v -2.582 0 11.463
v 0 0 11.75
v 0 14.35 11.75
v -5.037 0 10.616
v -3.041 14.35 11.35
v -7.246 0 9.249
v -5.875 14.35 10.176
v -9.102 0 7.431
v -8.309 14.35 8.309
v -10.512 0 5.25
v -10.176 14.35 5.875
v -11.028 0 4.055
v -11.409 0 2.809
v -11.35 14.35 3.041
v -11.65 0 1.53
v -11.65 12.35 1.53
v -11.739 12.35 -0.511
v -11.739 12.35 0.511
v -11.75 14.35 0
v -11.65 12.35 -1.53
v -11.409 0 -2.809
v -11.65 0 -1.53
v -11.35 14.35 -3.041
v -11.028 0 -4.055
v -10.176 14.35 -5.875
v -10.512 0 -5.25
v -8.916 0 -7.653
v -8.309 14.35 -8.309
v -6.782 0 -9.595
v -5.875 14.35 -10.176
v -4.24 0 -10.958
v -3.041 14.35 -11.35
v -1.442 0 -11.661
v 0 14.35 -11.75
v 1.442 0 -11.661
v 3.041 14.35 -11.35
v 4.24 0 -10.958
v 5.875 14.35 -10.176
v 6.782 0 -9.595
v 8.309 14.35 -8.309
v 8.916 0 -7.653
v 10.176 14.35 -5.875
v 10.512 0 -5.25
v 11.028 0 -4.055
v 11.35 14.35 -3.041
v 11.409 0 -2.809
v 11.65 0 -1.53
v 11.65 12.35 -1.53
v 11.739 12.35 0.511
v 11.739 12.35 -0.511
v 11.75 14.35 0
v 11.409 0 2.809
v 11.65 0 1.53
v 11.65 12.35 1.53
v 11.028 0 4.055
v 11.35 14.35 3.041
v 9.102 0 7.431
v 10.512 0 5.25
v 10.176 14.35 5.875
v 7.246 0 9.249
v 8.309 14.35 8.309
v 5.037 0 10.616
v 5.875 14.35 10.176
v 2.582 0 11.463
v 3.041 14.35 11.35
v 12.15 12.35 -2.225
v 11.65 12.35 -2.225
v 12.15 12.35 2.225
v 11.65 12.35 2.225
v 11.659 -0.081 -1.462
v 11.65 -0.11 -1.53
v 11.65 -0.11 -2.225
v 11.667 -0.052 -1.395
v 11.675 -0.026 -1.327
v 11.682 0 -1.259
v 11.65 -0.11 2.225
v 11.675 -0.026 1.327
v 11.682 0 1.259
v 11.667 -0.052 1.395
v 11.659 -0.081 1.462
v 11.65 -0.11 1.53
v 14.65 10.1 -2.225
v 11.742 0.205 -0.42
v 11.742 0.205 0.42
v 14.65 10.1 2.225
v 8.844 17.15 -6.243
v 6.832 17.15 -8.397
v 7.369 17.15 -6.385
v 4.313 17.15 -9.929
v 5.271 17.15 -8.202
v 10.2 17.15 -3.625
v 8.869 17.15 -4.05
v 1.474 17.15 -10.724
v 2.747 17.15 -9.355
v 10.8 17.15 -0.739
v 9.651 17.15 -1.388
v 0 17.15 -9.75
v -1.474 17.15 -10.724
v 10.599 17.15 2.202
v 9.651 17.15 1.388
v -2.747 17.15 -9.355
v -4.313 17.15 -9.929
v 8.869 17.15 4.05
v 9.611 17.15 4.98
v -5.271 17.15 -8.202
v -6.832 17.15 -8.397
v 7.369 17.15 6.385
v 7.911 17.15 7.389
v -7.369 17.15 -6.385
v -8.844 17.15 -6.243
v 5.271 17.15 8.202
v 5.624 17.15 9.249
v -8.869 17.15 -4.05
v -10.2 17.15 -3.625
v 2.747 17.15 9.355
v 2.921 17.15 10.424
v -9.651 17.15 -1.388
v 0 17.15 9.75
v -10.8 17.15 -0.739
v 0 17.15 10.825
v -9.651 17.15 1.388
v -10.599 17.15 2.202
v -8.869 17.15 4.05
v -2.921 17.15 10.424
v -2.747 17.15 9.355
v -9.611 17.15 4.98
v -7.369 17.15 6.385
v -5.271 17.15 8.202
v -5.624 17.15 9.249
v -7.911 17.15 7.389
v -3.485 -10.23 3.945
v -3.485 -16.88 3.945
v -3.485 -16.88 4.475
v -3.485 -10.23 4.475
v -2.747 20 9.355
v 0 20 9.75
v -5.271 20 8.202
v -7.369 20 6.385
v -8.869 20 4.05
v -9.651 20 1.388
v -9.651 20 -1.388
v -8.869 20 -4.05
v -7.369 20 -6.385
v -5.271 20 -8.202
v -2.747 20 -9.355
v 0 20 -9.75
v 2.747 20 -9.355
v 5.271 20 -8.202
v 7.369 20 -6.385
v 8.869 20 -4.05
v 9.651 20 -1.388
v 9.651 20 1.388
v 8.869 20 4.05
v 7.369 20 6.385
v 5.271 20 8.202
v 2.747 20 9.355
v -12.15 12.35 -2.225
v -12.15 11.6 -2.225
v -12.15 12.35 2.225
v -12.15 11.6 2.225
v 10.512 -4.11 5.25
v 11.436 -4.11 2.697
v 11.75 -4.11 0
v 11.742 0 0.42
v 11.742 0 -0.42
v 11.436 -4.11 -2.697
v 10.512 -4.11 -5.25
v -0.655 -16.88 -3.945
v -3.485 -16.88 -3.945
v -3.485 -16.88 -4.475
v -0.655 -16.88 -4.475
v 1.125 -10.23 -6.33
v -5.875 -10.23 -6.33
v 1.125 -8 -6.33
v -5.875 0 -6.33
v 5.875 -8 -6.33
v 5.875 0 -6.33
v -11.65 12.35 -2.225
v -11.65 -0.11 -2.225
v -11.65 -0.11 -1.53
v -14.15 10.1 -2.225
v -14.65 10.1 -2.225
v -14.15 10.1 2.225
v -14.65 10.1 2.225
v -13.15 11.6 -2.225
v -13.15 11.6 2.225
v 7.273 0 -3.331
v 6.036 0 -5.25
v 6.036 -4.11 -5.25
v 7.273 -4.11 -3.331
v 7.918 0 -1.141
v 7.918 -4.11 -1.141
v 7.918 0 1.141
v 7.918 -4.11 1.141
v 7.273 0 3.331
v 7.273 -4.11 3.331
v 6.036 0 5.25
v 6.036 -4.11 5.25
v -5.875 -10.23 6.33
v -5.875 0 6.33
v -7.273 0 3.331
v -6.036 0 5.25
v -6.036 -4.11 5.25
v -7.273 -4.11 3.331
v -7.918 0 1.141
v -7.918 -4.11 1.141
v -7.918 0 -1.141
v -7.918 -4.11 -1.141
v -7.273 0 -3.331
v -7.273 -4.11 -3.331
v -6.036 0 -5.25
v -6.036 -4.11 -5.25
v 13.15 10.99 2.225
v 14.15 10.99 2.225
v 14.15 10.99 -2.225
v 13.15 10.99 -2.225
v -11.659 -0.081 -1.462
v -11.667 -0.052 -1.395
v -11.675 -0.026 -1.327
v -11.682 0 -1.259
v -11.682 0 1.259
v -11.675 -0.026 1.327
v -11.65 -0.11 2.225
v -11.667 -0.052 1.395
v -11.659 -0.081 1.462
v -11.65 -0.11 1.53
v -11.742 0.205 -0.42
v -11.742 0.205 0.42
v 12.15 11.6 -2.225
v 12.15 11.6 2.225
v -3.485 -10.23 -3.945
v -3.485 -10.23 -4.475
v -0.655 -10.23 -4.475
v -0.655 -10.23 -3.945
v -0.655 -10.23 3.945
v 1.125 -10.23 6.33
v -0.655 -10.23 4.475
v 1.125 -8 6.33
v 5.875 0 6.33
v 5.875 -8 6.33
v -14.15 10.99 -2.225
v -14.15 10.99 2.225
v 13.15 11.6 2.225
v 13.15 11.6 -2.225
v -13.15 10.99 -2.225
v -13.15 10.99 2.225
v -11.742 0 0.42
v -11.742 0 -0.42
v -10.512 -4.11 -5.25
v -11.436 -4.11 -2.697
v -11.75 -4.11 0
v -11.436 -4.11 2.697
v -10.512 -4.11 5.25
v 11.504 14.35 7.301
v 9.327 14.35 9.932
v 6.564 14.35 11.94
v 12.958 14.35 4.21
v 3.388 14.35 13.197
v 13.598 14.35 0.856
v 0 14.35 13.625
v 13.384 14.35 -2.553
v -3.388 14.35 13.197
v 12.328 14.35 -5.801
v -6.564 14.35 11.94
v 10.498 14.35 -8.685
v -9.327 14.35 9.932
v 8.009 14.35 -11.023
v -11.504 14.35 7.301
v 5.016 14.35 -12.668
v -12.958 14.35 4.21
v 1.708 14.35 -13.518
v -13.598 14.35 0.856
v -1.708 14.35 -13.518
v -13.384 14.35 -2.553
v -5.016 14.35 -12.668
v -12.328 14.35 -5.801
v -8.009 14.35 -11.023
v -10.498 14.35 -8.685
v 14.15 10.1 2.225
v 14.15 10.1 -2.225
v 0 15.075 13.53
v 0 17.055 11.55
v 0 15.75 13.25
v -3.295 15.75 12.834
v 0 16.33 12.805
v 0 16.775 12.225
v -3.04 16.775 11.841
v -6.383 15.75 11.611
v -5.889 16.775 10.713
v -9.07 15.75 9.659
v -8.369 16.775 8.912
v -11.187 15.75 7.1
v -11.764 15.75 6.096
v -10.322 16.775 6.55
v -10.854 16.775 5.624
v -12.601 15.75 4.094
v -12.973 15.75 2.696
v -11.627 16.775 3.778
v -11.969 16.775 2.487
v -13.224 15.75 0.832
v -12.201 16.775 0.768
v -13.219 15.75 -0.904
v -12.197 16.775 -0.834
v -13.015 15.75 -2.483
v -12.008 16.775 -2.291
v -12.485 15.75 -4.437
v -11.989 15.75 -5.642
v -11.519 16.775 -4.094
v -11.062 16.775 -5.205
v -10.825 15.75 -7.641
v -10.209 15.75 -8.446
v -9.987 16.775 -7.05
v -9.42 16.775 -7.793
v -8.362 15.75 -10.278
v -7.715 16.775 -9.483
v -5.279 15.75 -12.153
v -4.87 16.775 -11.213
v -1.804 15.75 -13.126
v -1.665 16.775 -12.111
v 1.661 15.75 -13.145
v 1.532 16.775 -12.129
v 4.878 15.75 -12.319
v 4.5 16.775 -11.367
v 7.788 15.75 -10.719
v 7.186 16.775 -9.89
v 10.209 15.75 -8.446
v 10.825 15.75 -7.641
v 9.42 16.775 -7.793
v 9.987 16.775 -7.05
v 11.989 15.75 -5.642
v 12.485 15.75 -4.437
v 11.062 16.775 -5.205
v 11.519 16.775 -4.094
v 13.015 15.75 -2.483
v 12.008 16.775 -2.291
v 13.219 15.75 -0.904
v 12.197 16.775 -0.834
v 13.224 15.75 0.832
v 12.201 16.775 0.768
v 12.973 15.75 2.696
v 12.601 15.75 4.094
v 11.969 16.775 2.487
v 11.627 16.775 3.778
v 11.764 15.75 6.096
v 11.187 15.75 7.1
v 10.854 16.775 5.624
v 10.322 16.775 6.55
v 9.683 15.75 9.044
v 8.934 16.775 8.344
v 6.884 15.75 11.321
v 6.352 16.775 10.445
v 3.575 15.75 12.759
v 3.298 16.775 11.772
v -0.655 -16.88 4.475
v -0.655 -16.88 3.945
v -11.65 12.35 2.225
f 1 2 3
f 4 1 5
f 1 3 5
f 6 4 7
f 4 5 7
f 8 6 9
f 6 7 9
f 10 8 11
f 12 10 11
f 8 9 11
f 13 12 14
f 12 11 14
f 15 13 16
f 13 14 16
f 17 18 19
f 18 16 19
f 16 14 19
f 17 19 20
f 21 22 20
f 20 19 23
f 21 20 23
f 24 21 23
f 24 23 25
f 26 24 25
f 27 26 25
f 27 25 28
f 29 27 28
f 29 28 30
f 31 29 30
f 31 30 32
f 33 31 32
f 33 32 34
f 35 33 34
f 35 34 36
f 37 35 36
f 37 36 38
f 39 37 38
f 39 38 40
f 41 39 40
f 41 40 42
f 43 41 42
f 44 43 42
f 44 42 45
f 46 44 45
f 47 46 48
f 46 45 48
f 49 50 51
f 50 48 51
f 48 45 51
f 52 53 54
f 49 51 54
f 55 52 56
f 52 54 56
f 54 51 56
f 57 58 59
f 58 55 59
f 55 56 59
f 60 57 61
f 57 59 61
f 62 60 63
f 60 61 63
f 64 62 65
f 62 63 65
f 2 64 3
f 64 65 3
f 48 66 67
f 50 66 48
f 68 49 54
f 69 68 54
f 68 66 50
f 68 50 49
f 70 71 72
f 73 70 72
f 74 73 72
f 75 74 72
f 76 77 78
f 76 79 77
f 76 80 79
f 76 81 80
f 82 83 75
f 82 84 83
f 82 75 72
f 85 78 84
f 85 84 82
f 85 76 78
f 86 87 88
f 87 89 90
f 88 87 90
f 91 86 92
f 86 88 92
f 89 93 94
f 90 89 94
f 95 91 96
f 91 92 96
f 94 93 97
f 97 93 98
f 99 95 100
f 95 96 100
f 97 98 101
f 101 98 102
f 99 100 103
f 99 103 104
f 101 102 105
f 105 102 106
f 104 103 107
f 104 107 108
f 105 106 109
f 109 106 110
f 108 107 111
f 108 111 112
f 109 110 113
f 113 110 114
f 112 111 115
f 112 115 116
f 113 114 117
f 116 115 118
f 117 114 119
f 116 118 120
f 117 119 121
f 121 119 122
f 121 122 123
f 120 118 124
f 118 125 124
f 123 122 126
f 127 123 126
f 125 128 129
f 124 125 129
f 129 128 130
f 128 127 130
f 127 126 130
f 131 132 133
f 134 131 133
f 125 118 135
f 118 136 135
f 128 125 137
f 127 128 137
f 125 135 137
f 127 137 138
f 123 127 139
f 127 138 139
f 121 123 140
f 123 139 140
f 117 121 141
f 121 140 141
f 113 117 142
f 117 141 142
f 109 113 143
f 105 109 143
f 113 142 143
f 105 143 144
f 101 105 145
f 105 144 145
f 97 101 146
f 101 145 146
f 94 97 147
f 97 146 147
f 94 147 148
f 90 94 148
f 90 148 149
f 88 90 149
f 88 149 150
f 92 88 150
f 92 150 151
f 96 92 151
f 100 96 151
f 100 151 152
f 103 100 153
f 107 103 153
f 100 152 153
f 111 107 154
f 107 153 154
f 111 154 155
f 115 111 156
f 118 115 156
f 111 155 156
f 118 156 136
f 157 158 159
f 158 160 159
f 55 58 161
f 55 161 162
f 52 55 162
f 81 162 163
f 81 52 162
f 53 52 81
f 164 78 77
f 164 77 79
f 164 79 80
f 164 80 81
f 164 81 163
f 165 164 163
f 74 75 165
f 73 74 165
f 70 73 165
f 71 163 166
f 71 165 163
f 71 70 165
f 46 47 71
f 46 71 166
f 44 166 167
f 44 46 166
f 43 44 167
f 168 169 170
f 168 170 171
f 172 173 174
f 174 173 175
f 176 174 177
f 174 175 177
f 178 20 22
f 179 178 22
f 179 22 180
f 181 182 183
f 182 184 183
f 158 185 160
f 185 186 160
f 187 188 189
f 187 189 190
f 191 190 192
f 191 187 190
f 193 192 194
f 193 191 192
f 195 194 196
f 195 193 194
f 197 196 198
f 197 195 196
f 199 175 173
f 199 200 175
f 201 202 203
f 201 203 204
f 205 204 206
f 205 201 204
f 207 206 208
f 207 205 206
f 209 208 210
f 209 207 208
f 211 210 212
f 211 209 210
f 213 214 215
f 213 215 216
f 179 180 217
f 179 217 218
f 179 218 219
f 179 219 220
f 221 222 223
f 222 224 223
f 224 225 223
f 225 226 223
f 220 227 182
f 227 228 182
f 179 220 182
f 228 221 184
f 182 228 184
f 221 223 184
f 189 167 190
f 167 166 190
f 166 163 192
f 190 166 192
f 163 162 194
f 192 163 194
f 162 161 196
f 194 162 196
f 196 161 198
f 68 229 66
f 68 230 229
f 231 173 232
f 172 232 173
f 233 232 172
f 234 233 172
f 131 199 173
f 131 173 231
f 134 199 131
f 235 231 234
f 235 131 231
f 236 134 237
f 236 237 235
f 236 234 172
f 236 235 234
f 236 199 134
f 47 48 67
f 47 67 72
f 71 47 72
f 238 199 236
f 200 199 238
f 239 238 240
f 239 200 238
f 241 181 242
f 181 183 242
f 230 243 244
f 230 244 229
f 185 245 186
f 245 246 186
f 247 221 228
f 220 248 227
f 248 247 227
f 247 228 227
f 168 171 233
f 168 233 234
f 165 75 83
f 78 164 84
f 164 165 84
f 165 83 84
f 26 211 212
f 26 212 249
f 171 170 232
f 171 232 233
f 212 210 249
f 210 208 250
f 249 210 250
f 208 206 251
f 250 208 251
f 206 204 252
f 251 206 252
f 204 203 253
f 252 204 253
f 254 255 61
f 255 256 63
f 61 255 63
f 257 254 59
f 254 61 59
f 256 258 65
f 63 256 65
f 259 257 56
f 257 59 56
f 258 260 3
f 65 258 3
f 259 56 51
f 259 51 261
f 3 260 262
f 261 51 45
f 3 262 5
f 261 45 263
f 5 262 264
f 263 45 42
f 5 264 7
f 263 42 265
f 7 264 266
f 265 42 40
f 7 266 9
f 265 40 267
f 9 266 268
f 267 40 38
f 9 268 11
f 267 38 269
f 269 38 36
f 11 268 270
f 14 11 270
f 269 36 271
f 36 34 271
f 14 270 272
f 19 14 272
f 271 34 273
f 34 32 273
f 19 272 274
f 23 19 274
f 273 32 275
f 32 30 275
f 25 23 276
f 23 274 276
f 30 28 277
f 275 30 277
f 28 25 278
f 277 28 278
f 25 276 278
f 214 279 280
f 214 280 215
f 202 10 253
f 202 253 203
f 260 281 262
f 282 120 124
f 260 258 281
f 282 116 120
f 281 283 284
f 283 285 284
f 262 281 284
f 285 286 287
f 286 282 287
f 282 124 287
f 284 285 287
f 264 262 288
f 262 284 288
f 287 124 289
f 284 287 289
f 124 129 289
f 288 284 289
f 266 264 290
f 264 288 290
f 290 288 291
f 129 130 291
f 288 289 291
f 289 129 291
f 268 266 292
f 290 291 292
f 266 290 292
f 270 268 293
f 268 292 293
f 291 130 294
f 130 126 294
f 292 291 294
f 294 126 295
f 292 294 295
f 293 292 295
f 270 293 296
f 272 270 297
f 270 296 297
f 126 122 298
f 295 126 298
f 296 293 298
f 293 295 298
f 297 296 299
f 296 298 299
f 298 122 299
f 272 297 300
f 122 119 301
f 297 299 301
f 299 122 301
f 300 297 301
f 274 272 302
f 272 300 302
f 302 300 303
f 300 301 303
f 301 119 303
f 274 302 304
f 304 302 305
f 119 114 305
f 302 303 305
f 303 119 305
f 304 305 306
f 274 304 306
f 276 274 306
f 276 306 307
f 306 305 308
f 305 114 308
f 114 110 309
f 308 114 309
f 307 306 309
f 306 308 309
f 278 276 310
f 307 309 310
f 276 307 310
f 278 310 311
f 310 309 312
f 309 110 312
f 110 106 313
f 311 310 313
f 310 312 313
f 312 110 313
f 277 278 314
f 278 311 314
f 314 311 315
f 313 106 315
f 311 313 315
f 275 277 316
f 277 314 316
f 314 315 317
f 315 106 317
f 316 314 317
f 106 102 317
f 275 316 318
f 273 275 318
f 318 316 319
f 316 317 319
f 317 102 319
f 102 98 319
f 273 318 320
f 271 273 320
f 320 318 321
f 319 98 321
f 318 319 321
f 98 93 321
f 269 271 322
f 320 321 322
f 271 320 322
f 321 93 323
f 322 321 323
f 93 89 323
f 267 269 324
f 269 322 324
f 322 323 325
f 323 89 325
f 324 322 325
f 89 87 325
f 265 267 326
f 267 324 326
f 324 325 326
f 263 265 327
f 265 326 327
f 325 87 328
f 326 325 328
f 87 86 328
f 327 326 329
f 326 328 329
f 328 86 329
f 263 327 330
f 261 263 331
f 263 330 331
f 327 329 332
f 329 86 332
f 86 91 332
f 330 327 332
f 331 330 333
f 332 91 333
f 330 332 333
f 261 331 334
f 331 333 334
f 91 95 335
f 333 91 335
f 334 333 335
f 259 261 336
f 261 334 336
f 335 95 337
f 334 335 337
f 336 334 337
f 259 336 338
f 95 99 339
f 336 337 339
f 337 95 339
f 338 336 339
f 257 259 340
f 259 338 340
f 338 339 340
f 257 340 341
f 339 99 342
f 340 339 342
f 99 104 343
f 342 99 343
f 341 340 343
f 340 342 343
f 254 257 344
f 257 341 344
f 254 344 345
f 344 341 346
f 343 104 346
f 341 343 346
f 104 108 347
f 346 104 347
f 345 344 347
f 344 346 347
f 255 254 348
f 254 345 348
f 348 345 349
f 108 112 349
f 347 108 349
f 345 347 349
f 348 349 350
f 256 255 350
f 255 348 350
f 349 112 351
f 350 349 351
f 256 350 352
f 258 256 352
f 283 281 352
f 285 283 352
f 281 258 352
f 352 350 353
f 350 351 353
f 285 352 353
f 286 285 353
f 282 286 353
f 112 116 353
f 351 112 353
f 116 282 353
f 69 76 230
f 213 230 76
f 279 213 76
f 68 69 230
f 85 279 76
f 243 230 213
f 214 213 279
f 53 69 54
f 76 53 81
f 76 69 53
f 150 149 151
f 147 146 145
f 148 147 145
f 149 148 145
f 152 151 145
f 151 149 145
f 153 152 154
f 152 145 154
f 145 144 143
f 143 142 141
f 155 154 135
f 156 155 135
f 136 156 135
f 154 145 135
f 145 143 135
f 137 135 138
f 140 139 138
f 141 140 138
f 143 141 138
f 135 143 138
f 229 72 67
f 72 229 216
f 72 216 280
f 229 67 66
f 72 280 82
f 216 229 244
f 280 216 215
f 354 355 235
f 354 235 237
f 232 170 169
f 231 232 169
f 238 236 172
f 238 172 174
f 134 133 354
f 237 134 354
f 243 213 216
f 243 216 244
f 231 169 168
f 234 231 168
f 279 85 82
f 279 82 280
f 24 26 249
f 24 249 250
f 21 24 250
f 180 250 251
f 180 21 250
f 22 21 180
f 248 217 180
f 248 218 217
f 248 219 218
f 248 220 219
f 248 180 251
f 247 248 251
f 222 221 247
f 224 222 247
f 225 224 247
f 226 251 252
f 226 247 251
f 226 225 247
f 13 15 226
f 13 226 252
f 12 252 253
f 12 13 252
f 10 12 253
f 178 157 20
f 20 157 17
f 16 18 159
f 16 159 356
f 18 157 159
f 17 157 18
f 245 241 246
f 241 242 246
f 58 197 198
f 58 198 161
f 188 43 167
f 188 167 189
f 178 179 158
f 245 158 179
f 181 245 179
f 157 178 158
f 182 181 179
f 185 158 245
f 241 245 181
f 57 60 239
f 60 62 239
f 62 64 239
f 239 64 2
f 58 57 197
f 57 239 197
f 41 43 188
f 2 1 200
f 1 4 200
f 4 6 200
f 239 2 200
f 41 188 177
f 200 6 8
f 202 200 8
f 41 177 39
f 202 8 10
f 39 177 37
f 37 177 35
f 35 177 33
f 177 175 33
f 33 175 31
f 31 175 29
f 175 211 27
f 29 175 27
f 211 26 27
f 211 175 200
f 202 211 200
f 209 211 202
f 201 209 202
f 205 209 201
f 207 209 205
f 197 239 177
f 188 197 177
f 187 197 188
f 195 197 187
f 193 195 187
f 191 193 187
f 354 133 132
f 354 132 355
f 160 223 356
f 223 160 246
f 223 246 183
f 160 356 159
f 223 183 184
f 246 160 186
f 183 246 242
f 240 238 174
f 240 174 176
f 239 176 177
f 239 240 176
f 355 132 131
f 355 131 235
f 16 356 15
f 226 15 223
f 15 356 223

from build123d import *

# Parameters (mm, degrees)
BOSS_EXTRUDE1_DEPTH   = 6.33
BOSS_EXTRUDE2_DEPTH   = 4.11
SKETCH4_W             = 2.83
SKETCH4_H             = 0.53
BOSS_EXTRUDE3_DEPTH   = 6.65
BOSS_EXTRUDE4_DEPTH   = 2.225
BOSS_EXTRUDE4_2_DEPTH = 2.225


with BuildPart() as part:
    # Sketch1 → Revolve1 (revolve)
    with BuildSketch(Plane.XY, mode=Mode.PRIVATE) as revolve1_sk:
        with BuildLine():
            Line((0, 0), (-11.75, 0))
            Line((-11.75, 0), (-11.75, 14.35))
            Line((-11.75, 14.35), (-13.625, 14.35))
            ThreePointArc((-13.625, 14.35), (-12.804898987, 16.329898987), (-10.825, 17.15))
            Line((-10.825, 17.15), (-9.75, 17.15))
            Line((-9.75, 17.15), (-9.75, 20))
            Line((-9.75, 20), (0, 20))
            Line((0, 20), (0, 0))
        make_face()
    revolve(revolve1_sk.sketch.rotate(Axis((0, 0, 0), (0, -1, 0)), 270), axis=Axis((0, 0, 0), (0, -1, 0)))

    # Sketch2 → Boss-Extrude1 (add, symmetric)
    with BuildSketch(Plane.XY):
        Polygon((-5.875, 0), (-5.875, -10.23), (1.125, -10.23), (1.125, -8), (5.875, -8), (5.875, 0), align=None)
    extrude(amount=BOSS_EXTRUDE1_DEPTH, both=True)

    # Sketch3 → Boss-Extrude2 (add)
    with BuildSketch(Plane.XZ):
        with BuildLine():
            Line((-10.511898021, 5.25), (-6.036348234, 5.25))
            ThreePointArc((-6.036348234, 5.25), (-8, 0), (-6.036348234, -5.25))
            Line((-6.036348234, -5.25), (-10.511898021, -5.25))
            ThreePointArc((-10.511898021, -5.25), (-11.75, 0), (-10.511898021, 5.25))
        make_face()
        with BuildLine():
            Line((10.511898021, -5.25), (6.036348234, -5.25))
            ThreePointArc((6.036348234, -5.25), (8, 0), (6.036348234, 5.25))
            Line((6.036348234, 5.25), (10.511898021, 5.25))
            ThreePointArc((10.511898021, 5.25), (11.75, 0), (10.511898021, -5.25))
        make_face()
    extrude(amount=BOSS_EXTRUDE2_DEPTH)

    # Sketch4 → Boss-Extrude3 (add)
    with BuildSketch(Plane.XZ.offset(10.23)):
        with Locations((-2.07, 4.21)):
            Rectangle(SKETCH4_W, SKETCH4_H)
        with Locations((-2.07, -4.21)):
            Rectangle(SKETCH4_W, SKETCH4_H)
    extrude(amount=BOSS_EXTRUDE3_DEPTH)


with BuildPart() as body_2:
    # Sketch5 → Boss-Extrude4 (new, symmetric)
    with BuildSketch(Plane.XY):
        Polygon((-11.65, -0.11), (-14.65, 10.1), (-14.15, 10.1), (-14.15, 10.99), (-13.15, 10.99), (-13.15, 11.6), (-12.15, 11.6), (-12.15, 12.35), (-11.65, 12.35), align=None)
    extrude(amount=BOSS_EXTRUDE4_DEPTH, both=True)


with BuildPart() as body_3:
    # Sketch5 → Boss-Extrude4 2 (new, symmetric)
    with BuildSketch(Plane.XY):
        Polygon((11.65, 12.35), (11.65, -0.11), (14.65, 10.1), (14.15, 10.1), (14.15, 10.99), (13.15, 10.99), (13.15, 11.6), (12.15, 11.6), (12.15, 12.35), align=None)
    extrude(amount=BOSS_EXTRUDE4_2_DEPTH, both=True)

    # Combine2: union body 2, part
    add(body_2.part)
    add(part.part)


solid = body_3.part
